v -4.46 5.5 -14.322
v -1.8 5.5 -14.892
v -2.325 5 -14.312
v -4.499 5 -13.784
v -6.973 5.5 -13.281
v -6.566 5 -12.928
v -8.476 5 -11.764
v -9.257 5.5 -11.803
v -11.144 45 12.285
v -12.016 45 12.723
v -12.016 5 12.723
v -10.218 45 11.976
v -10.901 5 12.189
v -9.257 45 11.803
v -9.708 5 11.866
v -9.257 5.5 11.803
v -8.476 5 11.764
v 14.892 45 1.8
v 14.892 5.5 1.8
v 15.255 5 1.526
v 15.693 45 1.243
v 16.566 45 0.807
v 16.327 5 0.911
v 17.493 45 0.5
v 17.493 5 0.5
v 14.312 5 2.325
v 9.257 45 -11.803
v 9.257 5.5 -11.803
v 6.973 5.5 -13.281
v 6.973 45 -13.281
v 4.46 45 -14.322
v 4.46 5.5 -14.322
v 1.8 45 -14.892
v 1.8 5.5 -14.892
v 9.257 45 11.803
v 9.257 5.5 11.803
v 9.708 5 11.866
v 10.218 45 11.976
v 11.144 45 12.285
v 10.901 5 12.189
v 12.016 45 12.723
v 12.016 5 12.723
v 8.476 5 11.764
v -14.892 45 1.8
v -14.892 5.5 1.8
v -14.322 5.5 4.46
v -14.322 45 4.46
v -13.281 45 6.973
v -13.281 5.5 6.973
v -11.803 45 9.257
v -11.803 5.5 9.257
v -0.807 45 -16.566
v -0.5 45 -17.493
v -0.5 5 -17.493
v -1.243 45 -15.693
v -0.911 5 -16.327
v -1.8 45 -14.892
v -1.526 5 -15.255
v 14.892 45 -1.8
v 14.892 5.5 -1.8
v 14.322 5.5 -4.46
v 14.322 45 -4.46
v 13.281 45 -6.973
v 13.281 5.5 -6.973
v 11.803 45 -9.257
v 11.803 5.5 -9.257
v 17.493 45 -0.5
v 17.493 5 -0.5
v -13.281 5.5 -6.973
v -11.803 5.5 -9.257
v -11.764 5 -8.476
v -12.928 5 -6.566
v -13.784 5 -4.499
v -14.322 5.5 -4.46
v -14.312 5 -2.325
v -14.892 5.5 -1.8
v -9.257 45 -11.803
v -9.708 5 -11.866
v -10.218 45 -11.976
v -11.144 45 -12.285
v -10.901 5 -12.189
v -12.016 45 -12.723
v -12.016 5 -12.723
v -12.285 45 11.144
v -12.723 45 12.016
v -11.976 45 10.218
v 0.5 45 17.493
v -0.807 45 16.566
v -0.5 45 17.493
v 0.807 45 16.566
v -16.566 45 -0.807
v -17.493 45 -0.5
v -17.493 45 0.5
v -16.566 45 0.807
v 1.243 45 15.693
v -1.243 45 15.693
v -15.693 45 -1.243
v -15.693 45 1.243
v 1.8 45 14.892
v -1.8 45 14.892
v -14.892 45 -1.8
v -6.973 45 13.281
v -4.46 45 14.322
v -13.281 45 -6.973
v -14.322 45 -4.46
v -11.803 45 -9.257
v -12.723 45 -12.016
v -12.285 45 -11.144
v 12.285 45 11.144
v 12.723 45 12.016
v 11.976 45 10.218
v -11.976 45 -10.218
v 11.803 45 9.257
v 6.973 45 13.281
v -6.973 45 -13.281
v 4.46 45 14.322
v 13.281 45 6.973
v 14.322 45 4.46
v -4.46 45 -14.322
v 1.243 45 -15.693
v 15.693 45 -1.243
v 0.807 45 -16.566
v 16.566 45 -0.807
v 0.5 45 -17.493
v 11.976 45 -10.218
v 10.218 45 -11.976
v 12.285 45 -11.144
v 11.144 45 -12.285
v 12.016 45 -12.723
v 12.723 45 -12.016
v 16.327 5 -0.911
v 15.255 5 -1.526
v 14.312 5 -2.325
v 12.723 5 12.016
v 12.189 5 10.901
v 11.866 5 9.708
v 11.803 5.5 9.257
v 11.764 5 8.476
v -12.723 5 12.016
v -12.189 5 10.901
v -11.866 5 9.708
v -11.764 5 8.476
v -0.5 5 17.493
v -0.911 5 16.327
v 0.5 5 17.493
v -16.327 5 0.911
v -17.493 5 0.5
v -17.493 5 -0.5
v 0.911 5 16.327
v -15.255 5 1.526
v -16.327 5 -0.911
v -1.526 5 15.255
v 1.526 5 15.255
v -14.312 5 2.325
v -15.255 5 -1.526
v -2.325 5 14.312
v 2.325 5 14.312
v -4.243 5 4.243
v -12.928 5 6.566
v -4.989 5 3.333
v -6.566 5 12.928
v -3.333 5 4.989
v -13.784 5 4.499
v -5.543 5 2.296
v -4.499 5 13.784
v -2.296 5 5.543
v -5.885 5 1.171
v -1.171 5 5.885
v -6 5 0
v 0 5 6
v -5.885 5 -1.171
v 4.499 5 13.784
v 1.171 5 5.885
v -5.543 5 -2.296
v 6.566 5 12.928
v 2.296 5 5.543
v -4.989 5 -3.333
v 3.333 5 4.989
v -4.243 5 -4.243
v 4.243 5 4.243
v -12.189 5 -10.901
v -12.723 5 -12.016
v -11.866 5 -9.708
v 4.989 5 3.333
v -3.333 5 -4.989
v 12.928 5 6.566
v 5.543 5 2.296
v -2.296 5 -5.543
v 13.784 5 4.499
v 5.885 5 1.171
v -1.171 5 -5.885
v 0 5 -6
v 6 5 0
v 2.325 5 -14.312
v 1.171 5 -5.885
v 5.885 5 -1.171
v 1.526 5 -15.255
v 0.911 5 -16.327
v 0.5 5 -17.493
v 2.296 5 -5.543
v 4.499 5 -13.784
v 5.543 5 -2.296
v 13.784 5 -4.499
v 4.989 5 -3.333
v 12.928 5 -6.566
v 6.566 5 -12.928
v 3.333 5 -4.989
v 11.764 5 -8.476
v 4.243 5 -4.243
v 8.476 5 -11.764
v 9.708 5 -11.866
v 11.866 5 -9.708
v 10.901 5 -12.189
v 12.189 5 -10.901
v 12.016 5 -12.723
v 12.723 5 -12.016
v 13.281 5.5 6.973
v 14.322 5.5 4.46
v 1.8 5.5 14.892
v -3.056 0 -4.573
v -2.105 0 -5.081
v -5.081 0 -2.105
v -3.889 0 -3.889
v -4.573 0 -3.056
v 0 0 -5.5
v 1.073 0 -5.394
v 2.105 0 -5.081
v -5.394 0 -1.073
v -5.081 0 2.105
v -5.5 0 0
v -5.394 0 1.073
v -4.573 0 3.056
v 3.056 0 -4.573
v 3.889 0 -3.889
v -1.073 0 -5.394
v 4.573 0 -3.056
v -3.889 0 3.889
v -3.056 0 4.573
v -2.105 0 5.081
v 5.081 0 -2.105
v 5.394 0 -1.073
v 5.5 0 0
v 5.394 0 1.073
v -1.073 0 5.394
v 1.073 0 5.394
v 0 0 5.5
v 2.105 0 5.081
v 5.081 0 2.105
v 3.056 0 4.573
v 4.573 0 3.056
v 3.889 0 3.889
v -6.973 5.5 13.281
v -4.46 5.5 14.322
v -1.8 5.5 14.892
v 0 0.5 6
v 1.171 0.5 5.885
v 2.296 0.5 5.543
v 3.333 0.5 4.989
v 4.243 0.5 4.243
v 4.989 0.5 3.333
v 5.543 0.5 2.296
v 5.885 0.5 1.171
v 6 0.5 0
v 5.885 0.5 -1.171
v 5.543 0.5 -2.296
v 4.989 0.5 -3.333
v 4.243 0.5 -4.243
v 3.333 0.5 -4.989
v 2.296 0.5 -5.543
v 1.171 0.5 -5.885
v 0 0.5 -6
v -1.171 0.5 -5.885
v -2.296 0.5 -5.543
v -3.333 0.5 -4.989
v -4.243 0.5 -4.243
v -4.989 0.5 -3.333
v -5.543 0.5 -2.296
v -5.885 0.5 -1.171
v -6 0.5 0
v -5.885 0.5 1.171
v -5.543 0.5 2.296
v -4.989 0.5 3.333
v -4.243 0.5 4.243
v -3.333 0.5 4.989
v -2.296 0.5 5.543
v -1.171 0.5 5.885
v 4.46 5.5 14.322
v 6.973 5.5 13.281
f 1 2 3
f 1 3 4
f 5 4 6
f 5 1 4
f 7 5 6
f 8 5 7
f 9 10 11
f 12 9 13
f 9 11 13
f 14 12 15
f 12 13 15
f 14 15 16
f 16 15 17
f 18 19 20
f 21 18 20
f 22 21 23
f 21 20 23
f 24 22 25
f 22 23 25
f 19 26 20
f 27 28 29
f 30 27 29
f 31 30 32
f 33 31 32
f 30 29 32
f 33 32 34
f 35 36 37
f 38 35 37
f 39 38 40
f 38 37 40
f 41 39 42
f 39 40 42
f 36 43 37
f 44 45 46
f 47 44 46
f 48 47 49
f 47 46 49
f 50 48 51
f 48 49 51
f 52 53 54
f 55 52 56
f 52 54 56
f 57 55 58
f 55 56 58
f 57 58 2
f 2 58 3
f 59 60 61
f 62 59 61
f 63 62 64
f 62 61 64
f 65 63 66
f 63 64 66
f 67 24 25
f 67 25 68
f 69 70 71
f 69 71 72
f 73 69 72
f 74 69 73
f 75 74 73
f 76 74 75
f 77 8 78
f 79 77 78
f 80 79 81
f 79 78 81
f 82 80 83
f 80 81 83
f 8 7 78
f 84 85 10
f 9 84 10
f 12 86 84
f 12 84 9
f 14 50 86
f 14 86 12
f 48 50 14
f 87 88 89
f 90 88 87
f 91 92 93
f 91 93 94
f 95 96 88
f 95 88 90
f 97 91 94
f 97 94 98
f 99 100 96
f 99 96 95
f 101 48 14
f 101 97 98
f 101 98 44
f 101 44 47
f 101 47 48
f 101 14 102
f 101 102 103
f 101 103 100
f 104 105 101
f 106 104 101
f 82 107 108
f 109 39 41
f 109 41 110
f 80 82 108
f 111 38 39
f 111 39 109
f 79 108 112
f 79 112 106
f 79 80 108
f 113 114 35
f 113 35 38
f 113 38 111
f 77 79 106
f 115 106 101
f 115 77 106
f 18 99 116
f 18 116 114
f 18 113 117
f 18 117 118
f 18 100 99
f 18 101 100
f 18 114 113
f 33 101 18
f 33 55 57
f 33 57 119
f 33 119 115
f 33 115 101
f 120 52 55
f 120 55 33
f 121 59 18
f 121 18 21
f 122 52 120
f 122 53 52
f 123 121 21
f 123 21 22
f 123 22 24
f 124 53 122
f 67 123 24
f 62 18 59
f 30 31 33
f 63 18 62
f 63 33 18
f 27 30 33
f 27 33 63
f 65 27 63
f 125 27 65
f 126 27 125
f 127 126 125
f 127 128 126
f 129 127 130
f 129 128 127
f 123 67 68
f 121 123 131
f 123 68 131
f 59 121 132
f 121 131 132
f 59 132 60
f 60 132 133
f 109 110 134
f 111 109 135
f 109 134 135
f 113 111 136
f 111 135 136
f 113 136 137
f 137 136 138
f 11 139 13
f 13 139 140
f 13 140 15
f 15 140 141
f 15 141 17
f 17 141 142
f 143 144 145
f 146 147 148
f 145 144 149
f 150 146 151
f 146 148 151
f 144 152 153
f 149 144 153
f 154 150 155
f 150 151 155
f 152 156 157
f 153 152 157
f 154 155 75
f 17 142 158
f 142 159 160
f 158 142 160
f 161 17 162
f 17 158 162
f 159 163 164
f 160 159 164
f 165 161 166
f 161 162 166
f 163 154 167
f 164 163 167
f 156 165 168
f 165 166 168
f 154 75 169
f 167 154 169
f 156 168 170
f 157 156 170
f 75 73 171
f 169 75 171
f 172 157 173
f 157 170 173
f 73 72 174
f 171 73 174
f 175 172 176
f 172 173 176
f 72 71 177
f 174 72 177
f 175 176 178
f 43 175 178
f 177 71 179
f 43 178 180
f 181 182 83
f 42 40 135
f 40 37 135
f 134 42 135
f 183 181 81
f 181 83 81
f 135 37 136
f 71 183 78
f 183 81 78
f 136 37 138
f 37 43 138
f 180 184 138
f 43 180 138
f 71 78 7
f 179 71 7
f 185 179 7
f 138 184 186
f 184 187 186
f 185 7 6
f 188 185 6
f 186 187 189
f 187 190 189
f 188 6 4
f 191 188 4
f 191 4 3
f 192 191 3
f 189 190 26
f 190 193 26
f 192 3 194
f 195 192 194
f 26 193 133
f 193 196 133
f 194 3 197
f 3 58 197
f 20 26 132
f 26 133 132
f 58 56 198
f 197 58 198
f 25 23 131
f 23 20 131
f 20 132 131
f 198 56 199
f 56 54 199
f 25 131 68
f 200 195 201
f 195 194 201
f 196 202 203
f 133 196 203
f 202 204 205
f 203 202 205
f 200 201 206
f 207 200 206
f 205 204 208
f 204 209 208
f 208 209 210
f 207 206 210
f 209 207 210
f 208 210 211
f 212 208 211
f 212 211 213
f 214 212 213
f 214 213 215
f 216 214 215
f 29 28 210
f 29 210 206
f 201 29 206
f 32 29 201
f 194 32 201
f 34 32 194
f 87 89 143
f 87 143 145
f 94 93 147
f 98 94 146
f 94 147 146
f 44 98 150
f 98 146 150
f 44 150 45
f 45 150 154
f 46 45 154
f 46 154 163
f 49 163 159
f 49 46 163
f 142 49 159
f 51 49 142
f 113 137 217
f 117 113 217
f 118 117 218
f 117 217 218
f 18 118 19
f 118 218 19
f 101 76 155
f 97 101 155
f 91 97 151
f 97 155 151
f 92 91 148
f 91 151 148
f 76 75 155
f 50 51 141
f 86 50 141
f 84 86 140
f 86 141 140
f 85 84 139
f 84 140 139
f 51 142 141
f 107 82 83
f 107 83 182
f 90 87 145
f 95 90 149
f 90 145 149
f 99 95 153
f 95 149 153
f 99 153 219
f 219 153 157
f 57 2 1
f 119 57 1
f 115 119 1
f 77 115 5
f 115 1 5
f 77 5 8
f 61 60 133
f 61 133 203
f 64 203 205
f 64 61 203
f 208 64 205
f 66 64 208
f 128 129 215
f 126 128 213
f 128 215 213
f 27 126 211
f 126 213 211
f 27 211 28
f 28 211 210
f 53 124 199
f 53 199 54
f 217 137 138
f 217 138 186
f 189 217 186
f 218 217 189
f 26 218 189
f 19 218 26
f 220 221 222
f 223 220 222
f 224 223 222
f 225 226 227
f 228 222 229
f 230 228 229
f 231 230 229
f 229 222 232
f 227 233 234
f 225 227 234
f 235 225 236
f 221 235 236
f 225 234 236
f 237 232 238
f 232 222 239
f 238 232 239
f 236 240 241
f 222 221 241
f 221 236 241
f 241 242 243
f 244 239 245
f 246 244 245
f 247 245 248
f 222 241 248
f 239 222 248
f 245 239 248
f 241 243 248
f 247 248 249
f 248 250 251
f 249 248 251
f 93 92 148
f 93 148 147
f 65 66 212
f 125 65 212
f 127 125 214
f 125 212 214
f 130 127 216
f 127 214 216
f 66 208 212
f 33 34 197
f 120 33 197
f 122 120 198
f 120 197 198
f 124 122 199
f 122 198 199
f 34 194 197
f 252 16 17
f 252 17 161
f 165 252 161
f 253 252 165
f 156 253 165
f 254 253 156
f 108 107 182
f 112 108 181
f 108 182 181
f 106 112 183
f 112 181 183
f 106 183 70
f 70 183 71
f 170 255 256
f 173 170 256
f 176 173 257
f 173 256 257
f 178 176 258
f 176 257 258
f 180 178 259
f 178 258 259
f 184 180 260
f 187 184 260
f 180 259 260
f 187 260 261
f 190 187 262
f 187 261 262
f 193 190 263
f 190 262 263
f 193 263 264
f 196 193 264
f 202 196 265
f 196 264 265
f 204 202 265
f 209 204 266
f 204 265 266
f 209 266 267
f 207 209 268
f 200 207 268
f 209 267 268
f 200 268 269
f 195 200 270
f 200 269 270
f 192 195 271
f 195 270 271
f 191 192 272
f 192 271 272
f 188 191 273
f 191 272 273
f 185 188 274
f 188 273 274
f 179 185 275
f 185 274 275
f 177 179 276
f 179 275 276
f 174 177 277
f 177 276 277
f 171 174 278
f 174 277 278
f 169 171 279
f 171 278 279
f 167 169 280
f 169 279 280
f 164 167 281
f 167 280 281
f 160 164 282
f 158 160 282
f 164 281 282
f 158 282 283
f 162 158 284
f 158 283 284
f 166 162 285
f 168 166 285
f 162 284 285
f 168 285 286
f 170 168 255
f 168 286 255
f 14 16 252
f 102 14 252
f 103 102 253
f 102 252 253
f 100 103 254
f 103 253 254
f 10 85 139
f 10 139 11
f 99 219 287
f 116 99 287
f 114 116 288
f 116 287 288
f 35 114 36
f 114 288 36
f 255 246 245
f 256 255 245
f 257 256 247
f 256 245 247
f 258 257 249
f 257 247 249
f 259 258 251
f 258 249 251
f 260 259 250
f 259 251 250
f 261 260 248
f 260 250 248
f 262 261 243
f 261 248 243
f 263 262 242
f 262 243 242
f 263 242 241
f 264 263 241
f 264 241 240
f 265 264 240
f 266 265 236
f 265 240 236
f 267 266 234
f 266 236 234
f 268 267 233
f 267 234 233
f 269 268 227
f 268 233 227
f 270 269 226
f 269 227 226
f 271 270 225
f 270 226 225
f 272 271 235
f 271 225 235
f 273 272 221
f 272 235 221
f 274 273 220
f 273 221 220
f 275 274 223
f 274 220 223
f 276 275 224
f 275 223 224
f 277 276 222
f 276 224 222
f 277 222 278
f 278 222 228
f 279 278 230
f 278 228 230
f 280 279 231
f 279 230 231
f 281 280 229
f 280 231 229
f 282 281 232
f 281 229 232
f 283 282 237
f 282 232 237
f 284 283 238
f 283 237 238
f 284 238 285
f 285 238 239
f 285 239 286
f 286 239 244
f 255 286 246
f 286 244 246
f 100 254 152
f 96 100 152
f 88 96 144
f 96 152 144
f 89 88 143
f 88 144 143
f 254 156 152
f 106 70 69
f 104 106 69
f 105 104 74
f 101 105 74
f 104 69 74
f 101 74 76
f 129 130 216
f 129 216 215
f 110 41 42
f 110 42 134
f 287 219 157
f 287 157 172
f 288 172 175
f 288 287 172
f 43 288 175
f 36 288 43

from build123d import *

# Parameters (mm, degrees)
SKETCH2_R           = 6
BOSS_EXTRUDE2_DEPTH = 5
SKETCH4_R           = 15
BOSS_EXTRUDE3_DEPTH = 40
BOSS_EXTRUDE4_START = -40
BOSS_EXTRUDE4_DEPTH = 40
CHAMFER1_SIZE       = 0.5
CHAMFER2_SIZE       = 0.5


with BuildPart() as part:
    # Sketch2 → Boss-Extrude2 (new body)
    with BuildSketch(Plane(origin=(0, 0, 0), x_dir=(1, 0, 0), z_dir=(0, 1, 0))):
        with Locations(Location((0, 0, 0), (0, 0, 270))):
            Circle(SKETCH2_R)
    extrude(amount=BOSS_EXTRUDE2_DEPTH)

    # Sketch4 → Boss-Extrude3 (add)
    with BuildSketch(Plane(origin=(0, 5, 0), x_dir=(1, 0, 0), z_dir=(0, 1, 0))):
        with Locations(Location((0, 0, 0), (0, 0, 270))):
            Circle(SKETCH4_R)
    extrude(amount=BOSS_EXTRUDE3_DEPTH)

    # Sketch5 → Boss-Extrude4 (add)
    with BuildSketch(Plane(origin=(0, 45, 0), x_dir=(1, 0, 0), z_dir=(0, 1, 0)).offset(BOSS_EXTRUDE4_START)):
        with BuildLine():
            ThreePointArc((-11.802749471, 9.257165059), (-10.606601718, 10.606601718), (-9.257165059, 11.802749471))
            ThreePointArc((-9.257165059, 11.802749471), (-10.686189168, 12.11373051), (-12.015763486, 12.722870267))
            Line((-12.015763486, 12.722870267), (-12.722870267, 12.015763486))
            ThreePointArc((-12.722870267, 12.015763486), (-12.11373051, 10.686189168), (-11.802749471, 9.257165059))
        make_face()
        with BuildLine():
            ThreePointArc((-1.8, 14.891608375), (-0.901630293, 14.972877573), (0, 15))
            Line((0, 15), (0, 17.492855685))
            Line((0, 17.492855685), (-0.5, 17.492855685))
            ThreePointArc((-0.5, 17.492855685), (-1.009424163, 16.121977815), (-1.8, 14.891608375))
        make_face()
        with BuildLine():
            Line((0, 17.492855685), (0, 15))
            ThreePointArc((0, 15), (0.901630293, 14.972877573), (1.8, 14.891608375))
            ThreePointArc((1.8, 14.891608375), (1.009424163, 16.121977815), (0.5, 17.492855685))
            Line((0.5, 17.492855685), (0, 17.492855685))
        make_face()
        with BuildLine():
            ThreePointArc((12.015763486, 12.722870267), (10.686189168, 12.11373051), (9.257165059, 11.802749471))
            ThreePointArc((9.257165059, 11.802749471), (10.606601718, 10.606601718), (11.802749471, 9.257165059))
            ThreePointArc((11.802749471, 9.257165059), (12.11373051, 10.686189168), (12.722870267, 12.015763486))
            Line((12.722870267, 12.015763486), (12.015763486, 12.722870267))
        make_face()
        with BuildLine():
            ThreePointArc((-14.891608375, -1.8), (-15, 0), (-14.891608375, 1.8))
            ThreePointArc((-14.891608375, 1.8), (-16.121977815, 1.009424163), (-17.492855685, 0.5))
            Line((-17.492855685, 0.5), (-17.492855685, -0.5))
            ThreePointArc((-17.492855685, -0.5), (-16.121977815, -1.009424163), (-14.891608375, -1.8))
        make_face()
        with BuildLine():
            ThreePointArc((-9.257165059, -11.802749471), (-10.606601718, -10.606601718), (-11.802749471, -9.257165059))
            ThreePointArc((-11.802749471, -9.257165059), (-12.11373051, -10.686189168), (-12.722870267, -12.015763486))
            Line((-12.722870267, -12.015763486), (-12.015763486, -12.722870267))
            ThreePointArc((-12.015763486, -12.722870267), (-10.686189168, -12.11373051), (-9.257165059, -11.802749471))
        make_face()
        with BuildLine():
            ThreePointArc((1.8, -14.891608375), (0, -15), (-1.8, -14.891608375))
            ThreePointArc((-1.8, -14.891608375), (-1.009424163, -16.121977815), (-0.5, -17.492855685))
            Line((-0.5, -17.492855685), (0.5, -17.492855685))
            ThreePointArc((0.5, -17.492855685), (1.009424163, -16.121977815), (1.8, -14.891608375))
        make_face()
        with BuildLine():
            Line((12.015763486, -12.722870267), (12.722870267, -12.015763486))
            ThreePointArc((12.722870267, -12.015763486), (12.11373051, -10.686189168), (11.802749471, -9.257165059))
            ThreePointArc((11.802749471, -9.257165059), (10.606601718, -10.606601718), (9.257165059, -11.802749471))
            ThreePointArc((9.257165059, -11.802749471), (10.686189168, -12.11373051), (12.015763486, -12.722870267))
        make_face()
        with BuildLine():
            ThreePointArc((17.492855685, 0.5), (16.121977815, 1.009424163), (14.891608375, 1.8))
            ThreePointArc((14.891608375, 1.8), (14.972877573, 0.901630293), (15, 0))
            ThreePointArc((15, 0), (14.972877573, -0.901630293), (14.891608375, -1.8))
            ThreePointArc((14.891608375, -1.8), (16.121977815, -1.009424163), (17.492855685, -0.5))
            Line((17.492855685, -0.5), (17.492855685, 0.5))
        make_face()
    extrude(amount=BOSS_EXTRUDE4_DEPTH)

    # Chamfer1
    chamfer1_edges = [part.edges().sort_by_distance(p)[0] for p in [
        (0, 0, -6),
    ]]
    chamfer(chamfer1_edges, length=CHAMFER1_SIZE)

    # Chamfer2
    chamfer2_edges = [part.edges().sort_by_distance(p)[0] for p in [
        (-13.858192988, 5, -5.740251485),
        (-5.740251485, 5, -13.858192988),
        (5.740251485, 5, -13.858192988),
        (-13.858192988, 5, 5.740251485),
        (-5.740251485, 5, 13.858192988),
        (5.740251485, 5, 13.858192988),
        (13.858192988, 5, 5.740251485),
        (13.858192988, 5, -5.740251485),
    ]]
    chamfer(chamfer2_edges, length=CHAMFER2_SIZE)


solid = part.part
